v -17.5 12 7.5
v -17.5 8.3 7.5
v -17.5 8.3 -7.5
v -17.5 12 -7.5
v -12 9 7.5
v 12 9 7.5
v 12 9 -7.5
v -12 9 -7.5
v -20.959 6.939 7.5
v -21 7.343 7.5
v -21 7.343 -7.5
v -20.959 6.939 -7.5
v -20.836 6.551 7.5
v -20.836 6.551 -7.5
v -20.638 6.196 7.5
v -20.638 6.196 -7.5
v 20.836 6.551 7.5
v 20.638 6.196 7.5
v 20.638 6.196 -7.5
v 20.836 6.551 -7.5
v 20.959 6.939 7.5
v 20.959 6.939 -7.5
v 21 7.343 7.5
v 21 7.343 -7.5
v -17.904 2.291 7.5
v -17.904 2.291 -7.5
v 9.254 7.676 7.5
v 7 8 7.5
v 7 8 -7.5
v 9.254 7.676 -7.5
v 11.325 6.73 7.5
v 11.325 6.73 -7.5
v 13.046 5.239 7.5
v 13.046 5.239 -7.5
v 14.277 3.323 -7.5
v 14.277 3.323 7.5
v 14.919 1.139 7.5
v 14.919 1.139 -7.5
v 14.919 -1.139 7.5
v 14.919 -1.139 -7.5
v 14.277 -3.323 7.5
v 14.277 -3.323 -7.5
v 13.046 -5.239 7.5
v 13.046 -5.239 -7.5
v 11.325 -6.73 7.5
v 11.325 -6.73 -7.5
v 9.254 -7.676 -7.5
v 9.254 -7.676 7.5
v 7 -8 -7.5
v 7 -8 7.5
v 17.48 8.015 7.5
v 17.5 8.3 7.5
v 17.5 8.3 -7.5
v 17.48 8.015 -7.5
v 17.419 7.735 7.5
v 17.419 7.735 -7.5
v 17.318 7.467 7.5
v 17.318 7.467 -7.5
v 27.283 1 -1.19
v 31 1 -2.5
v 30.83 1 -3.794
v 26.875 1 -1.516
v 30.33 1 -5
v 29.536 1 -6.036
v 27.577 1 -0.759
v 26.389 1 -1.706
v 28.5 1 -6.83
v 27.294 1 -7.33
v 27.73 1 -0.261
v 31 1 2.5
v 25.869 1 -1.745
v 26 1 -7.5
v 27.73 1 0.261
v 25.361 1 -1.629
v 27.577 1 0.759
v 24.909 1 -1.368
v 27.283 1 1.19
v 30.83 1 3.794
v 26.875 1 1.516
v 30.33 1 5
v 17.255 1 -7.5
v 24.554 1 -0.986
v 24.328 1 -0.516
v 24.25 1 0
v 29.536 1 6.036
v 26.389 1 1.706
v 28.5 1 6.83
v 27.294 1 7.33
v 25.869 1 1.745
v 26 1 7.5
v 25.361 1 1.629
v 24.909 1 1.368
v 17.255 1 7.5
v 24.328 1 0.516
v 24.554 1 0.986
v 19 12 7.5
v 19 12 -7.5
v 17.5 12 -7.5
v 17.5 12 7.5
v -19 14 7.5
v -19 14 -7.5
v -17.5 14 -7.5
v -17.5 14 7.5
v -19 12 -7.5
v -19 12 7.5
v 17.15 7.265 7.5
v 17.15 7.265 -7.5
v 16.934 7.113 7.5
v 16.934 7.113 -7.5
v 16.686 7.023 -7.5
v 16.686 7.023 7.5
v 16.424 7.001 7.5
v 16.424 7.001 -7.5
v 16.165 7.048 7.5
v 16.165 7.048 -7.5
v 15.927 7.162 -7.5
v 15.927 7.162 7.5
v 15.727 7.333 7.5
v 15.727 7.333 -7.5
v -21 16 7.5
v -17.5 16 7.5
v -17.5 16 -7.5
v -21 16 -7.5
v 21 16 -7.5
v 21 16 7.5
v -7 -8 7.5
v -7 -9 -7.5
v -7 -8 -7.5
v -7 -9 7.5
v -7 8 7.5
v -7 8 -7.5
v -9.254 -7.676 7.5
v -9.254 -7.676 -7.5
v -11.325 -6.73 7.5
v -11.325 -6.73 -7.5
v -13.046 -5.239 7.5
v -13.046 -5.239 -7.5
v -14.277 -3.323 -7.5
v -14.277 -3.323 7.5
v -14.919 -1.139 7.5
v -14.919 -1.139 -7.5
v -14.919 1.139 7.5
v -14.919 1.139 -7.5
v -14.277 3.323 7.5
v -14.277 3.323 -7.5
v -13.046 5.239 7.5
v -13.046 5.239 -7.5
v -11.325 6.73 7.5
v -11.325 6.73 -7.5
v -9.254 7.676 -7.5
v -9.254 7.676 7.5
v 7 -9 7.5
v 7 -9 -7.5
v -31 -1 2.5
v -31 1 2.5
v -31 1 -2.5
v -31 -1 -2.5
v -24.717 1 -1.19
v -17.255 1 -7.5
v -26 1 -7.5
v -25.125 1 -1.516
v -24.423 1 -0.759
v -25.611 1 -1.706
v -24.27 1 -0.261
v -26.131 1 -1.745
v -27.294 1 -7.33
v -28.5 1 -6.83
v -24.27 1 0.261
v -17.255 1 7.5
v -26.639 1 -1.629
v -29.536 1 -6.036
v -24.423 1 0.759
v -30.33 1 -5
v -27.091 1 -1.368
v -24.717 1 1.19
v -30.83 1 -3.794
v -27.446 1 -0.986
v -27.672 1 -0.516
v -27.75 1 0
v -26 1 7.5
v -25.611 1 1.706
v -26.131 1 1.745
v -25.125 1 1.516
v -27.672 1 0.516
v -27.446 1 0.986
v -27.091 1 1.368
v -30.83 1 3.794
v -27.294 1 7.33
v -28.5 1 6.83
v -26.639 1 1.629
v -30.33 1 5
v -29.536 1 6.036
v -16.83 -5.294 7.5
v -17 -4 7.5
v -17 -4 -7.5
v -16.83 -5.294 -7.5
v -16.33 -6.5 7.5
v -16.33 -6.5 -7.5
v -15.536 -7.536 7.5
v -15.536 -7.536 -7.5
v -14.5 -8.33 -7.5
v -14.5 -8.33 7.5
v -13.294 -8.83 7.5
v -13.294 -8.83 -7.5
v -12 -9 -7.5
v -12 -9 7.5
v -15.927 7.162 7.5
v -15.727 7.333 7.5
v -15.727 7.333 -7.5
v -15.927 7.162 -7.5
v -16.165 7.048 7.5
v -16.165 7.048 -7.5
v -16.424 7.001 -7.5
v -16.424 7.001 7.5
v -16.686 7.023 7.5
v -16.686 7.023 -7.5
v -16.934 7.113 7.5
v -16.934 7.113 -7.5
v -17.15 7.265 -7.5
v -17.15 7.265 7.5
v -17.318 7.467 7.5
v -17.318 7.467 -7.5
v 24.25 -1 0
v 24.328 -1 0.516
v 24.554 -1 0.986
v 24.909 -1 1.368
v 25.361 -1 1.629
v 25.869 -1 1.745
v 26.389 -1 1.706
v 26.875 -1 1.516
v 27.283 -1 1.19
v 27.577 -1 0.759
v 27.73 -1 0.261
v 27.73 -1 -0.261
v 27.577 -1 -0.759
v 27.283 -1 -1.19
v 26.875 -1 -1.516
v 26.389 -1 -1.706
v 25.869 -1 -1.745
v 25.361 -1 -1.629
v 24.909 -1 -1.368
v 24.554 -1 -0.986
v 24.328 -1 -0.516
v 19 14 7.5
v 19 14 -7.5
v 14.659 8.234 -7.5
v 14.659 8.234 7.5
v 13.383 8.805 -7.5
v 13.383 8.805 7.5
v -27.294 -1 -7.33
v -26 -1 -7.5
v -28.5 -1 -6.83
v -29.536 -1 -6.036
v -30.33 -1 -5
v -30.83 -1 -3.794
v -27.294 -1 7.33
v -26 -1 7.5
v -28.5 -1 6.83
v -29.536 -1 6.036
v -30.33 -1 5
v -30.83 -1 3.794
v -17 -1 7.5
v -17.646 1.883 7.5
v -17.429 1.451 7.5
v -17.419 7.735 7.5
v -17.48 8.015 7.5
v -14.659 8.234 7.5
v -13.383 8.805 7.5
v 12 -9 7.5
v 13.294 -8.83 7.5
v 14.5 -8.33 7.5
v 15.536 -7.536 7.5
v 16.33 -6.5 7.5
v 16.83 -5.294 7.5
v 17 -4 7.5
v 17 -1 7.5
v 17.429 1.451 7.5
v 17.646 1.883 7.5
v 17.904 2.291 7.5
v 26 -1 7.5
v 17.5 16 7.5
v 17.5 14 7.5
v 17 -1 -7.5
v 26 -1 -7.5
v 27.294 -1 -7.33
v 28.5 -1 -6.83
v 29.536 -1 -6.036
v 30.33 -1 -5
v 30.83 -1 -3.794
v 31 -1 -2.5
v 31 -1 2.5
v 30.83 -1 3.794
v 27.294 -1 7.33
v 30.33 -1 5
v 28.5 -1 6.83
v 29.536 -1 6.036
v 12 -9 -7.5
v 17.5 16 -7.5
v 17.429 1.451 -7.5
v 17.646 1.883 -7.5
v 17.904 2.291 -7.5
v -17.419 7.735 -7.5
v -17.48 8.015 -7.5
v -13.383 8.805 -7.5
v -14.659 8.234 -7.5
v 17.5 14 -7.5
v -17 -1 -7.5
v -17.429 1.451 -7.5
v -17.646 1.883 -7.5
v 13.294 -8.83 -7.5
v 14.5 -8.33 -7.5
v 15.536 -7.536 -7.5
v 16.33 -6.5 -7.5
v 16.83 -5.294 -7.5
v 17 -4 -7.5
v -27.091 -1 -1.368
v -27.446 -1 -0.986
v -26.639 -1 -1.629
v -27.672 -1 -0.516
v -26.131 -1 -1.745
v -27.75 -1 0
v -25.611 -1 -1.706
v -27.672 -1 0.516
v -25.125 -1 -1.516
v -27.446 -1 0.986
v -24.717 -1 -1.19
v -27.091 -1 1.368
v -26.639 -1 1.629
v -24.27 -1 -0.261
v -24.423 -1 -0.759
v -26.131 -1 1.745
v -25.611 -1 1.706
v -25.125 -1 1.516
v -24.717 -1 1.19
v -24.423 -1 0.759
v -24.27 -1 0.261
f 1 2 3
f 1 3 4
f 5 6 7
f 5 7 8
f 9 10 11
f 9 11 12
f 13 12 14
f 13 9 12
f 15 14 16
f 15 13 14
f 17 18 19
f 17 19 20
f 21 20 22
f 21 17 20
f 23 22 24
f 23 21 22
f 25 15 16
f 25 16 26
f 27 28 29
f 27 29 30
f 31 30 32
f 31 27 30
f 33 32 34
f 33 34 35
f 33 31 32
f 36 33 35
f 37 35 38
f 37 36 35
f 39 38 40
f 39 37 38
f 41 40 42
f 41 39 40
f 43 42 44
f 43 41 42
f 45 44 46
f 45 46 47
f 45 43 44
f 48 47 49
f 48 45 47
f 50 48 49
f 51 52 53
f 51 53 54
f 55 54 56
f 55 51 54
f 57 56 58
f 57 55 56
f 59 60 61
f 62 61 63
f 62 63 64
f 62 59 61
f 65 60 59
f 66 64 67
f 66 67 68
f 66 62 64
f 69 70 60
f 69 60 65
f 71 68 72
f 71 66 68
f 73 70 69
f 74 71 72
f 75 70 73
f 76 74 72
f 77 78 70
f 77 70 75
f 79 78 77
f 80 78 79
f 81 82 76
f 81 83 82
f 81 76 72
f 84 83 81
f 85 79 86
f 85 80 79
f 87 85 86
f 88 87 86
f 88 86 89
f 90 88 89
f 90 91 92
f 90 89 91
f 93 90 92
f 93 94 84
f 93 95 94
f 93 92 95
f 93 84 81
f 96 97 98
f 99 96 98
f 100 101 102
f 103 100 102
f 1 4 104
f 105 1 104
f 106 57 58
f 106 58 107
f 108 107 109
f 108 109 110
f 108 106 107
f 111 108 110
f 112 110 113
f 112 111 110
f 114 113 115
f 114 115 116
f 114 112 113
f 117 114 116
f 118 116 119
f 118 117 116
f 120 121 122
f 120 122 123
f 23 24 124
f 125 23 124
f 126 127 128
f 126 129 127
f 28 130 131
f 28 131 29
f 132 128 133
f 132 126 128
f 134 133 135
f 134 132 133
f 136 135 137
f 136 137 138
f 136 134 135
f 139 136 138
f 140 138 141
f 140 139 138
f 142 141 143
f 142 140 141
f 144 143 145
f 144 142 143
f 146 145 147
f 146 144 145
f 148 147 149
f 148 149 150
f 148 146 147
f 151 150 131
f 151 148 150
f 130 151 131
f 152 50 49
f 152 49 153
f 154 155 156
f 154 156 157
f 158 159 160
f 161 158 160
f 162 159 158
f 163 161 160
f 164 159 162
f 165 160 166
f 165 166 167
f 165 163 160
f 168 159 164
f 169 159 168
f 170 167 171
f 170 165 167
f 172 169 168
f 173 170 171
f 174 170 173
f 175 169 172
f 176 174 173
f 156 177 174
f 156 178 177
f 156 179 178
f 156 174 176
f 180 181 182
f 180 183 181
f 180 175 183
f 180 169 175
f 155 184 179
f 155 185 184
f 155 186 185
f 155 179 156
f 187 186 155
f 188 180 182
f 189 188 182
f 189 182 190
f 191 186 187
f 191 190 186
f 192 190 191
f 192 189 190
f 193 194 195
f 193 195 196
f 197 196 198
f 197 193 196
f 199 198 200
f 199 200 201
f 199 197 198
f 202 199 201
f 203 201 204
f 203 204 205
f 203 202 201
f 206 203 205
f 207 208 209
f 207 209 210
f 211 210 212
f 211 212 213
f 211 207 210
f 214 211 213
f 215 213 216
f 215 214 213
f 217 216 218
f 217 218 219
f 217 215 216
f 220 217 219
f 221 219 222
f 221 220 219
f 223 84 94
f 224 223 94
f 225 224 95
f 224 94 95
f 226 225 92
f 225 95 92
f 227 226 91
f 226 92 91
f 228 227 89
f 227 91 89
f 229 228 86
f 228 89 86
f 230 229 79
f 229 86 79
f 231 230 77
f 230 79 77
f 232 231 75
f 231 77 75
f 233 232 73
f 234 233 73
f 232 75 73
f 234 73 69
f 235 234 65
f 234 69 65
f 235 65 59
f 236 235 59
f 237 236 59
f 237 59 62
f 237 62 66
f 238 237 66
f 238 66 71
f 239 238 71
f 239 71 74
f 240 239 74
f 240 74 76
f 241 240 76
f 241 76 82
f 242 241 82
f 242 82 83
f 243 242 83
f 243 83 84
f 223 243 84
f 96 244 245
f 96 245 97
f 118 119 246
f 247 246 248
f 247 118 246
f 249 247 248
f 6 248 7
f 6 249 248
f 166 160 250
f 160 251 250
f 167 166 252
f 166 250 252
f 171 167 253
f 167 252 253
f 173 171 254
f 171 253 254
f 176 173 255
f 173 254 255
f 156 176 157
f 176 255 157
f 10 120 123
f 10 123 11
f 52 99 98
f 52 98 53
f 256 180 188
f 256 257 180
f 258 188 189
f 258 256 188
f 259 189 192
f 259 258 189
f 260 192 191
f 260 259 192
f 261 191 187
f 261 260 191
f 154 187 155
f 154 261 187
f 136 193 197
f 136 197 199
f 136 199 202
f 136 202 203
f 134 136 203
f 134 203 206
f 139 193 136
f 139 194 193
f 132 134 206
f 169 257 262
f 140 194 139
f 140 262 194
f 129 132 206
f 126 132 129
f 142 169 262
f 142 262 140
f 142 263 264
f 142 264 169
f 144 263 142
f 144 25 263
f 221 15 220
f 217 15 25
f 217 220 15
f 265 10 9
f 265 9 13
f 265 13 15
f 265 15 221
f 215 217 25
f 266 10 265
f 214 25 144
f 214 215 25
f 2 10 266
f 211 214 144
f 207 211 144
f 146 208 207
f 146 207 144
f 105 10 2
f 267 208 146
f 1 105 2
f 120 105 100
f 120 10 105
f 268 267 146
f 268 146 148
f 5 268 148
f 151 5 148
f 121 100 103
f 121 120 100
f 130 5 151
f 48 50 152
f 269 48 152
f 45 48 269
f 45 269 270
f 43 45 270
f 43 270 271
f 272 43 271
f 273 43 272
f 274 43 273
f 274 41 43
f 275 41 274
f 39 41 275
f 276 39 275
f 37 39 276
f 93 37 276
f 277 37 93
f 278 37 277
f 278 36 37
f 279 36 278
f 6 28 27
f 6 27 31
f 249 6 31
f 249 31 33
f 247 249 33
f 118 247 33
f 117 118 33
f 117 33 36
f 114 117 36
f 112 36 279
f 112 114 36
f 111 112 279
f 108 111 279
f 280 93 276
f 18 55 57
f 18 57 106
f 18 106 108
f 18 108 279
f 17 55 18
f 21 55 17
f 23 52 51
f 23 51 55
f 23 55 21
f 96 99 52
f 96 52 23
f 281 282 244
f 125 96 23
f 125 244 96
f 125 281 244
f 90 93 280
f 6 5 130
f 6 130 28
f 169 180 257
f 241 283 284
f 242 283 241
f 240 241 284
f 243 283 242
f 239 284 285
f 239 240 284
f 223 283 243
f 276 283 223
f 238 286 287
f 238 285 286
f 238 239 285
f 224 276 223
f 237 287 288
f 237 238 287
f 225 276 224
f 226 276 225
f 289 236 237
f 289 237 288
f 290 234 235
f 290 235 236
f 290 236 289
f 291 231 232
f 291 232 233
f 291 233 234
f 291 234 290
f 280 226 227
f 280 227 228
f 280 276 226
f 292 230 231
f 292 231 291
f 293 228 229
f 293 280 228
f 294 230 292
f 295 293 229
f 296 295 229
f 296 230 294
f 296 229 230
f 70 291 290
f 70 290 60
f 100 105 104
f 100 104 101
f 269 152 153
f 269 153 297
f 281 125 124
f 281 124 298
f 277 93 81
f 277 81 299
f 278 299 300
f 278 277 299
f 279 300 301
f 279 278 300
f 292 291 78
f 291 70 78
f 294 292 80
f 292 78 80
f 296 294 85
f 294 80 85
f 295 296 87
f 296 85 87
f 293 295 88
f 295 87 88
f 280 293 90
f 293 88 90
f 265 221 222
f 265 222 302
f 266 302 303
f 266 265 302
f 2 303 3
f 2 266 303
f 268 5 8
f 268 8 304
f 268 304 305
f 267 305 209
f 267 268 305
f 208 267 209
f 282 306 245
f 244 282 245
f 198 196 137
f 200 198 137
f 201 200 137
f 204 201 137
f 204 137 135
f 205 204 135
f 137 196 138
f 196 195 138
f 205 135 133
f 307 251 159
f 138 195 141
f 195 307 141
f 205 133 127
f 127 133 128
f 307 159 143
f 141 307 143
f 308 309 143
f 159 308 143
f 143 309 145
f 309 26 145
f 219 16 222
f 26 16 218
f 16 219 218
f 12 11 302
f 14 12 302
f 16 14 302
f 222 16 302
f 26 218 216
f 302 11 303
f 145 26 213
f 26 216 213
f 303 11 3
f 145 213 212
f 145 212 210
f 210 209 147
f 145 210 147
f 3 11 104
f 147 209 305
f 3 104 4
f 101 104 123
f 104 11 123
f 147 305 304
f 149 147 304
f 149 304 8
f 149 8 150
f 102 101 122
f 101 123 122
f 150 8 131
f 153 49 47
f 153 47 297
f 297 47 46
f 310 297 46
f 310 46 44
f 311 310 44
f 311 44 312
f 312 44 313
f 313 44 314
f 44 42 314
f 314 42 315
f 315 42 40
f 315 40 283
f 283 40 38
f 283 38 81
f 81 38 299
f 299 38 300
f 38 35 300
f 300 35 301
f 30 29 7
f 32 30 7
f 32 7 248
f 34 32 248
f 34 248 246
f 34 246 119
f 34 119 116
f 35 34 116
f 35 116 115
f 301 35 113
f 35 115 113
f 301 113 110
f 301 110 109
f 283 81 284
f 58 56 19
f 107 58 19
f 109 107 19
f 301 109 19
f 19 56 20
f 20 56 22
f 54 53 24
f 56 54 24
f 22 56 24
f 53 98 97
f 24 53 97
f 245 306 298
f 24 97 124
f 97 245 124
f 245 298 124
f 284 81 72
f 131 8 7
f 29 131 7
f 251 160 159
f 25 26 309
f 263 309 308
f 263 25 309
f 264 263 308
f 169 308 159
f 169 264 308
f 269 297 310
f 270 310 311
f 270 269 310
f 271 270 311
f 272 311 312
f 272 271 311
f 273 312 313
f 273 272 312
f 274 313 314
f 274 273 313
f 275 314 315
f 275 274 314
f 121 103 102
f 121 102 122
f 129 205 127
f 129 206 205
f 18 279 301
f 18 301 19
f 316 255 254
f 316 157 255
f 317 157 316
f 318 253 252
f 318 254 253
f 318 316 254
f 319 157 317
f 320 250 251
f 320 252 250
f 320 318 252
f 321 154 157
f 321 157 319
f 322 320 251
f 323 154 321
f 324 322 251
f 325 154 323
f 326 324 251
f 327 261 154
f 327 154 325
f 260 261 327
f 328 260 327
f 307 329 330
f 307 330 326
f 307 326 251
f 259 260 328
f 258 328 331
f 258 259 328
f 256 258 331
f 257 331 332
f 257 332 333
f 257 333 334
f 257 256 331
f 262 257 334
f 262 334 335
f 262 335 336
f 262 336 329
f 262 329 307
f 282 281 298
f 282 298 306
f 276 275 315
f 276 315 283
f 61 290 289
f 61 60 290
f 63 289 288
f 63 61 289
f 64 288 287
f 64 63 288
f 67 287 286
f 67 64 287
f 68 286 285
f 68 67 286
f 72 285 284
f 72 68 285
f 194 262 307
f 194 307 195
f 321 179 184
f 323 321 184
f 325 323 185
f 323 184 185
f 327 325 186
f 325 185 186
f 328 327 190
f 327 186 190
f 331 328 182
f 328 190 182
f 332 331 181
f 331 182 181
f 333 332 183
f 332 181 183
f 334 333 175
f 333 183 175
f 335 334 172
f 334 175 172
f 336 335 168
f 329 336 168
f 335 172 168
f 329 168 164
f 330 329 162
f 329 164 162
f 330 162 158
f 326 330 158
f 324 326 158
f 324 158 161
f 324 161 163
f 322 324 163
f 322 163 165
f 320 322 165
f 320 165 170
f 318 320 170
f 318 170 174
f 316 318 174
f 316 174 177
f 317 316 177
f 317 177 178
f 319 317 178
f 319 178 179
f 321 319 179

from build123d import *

# Parameters (mm, degrees)
F1_DEPTH = 7.5
F3_DEPTH = 15
F4_R     = 1.75
F5_DEPTH = 25
F6_R     = 5


with BuildPart() as f1:
    # F0 (on Top) → F1 (new body, symmetric)
    with BuildSketch(Plane.XY):
        with BuildLine():
            ThreePointArc((-7, -8), (-15, 0), (-7, 8))
            Line((-7, 8), (7, 8))
            ThreePointArc((7, 8), (15, 0), (7, -8))
            Line((7, -8), (7, -9))
            Line((7, -9), (12, -9))
            ThreePointArc((12, -9), (15.5355339059, -7.5355339059), (17, -4))
            Line((17, -4), (17, -0.5764939444))
            ThreePointArc((17, -0.5764939444), (17.2314152463, 0.9270350531), (17.9042397786, 2.2913882374))
            Line((17.9042397786, 2.2913882374), (20.6383040886, 6.196036732))
            ThreePointArc((20.6383040886, 6.196036732), (20.9074339015, 6.7417780057), (21, 7.3431896047))
            Line((21, 7.3431896047), (21, 16))
            Line((21, 16), (17.5, 16))
            Line((17.5, 16), (17.5, 14))
            Line((17.5, 14), (19, 14))
            Line((19, 14), (19, 12))
            Line((19, 12), (17.5, 12))
            Line((17.5, 12), (17.5, 8.3))
            ThreePointArc((17.5, 8.3), (17.4540535831, 7.8737669717), (17.3183254055, 7.4671178237))
            ThreePointArc((17.3183254055, 7.4671178237), (16.5559000227, 7.003514385), (15.7267799625, 7.3333333333))
            ThreePointArc((15.7267799625, 7.3333333333), (14.0412414523, 8.5643546459), (12, 9))
            Line((12, 9), (-12, 9))
            ThreePointArc((-12, 9), (-14.0412414523, 8.5643546459), (-15.7267799625, 7.3333333333))
            ThreePointArc((-15.7267799625, 7.3333333333), (-16.5559000227, 7.003514385), (-17.3183254055, 7.4671178237))
            ThreePointArc((-17.3183254055, 7.4671178237), (-17.4540535831, 7.8737669717), (-17.5, 8.3))
            Line((-17.5, 8.3), (-17.5, 12))
            Line((-17.5, 12), (-19, 12))
            Line((-19, 12), (-19, 14))
            Line((-19, 14), (-17.5, 14))
            Line((-17.5, 14), (-17.5, 16))
            Line((-17.5, 16), (-21, 16))
            Line((-21, 16), (-21, 7.3431896047))
            ThreePointArc((-21, 7.3431896047), (-20.9074339015, 6.7417780057), (-20.6383040886, 6.196036732))
            Line((-20.6383040886, 6.196036732), (-17.9042397786, 2.2913882374))
            ThreePointArc((-17.9042397786, 2.2913882374), (-17.2314152463, 0.9270350531), (-17, -0.5764939444))
            Line((-17, -0.5764939444), (-17, -4))
            ThreePointArc((-17, -4), (-15.5355339059, -7.5355339059), (-12, -9))
            Line((-12, -9), (-7, -9))
            Line((-7, -9), (-7, -8))
        make_face()
    extrude(amount=F1_DEPTH, both=True)

    # F2 (on face) → F3 (join)
    with BuildSketch(Plane.XY.offset(7.5)):
        with BuildLine():
            Line((31, 1), (17.2550377406, 1))
            ThreePointArc((17.2550377406, 1), (17.0641712298, 0.2220011097), (17, -0.5764939444))
            Line((17, -0.5764939444), (17, -1))
            Line((17, -1), (31, -1))
            Line((31, -1), (31, 1))
        make_face()
        with BuildLine():
            Line((-31, -1), (-17, -1))
            Line((-17, -1), (-17, -0.5764939444))
            ThreePointArc((-17, -0.5764939444), (-17.0641712298, 0.2220011097), (-17.2550377406, 1))
            Line((-17.2550377406, 1), (-31, 1))
            Line((-31, 1), (-31, -1))
        make_face()
    extrude(amount=-F3_DEPTH)

    # F4 (on face) → F5 (cut)
    with BuildSketch(Plane(origin=(0, 1, 0), x_dir=(-1, 0, 0), z_dir=(0, 1, 0))):
        with Locations((-26, 0)):
            Circle(F4_R)
        with Locations((26, 0)):
            Circle(F4_R)
    extrude(amount=-F5_DEPTH, mode=Mode.SUBTRACT)

    # F6
    f6_edges = [f1.edges().sort_by_distance(p)[0] for p in [
        (-31, 0, -7.5),
        (-31, 0, 7.5),
        (31, 0, -7.5),
        (31, 0, 7.5),
    ]]
    fillet(f6_edges, radius=F6_R)


solid = f1.part
